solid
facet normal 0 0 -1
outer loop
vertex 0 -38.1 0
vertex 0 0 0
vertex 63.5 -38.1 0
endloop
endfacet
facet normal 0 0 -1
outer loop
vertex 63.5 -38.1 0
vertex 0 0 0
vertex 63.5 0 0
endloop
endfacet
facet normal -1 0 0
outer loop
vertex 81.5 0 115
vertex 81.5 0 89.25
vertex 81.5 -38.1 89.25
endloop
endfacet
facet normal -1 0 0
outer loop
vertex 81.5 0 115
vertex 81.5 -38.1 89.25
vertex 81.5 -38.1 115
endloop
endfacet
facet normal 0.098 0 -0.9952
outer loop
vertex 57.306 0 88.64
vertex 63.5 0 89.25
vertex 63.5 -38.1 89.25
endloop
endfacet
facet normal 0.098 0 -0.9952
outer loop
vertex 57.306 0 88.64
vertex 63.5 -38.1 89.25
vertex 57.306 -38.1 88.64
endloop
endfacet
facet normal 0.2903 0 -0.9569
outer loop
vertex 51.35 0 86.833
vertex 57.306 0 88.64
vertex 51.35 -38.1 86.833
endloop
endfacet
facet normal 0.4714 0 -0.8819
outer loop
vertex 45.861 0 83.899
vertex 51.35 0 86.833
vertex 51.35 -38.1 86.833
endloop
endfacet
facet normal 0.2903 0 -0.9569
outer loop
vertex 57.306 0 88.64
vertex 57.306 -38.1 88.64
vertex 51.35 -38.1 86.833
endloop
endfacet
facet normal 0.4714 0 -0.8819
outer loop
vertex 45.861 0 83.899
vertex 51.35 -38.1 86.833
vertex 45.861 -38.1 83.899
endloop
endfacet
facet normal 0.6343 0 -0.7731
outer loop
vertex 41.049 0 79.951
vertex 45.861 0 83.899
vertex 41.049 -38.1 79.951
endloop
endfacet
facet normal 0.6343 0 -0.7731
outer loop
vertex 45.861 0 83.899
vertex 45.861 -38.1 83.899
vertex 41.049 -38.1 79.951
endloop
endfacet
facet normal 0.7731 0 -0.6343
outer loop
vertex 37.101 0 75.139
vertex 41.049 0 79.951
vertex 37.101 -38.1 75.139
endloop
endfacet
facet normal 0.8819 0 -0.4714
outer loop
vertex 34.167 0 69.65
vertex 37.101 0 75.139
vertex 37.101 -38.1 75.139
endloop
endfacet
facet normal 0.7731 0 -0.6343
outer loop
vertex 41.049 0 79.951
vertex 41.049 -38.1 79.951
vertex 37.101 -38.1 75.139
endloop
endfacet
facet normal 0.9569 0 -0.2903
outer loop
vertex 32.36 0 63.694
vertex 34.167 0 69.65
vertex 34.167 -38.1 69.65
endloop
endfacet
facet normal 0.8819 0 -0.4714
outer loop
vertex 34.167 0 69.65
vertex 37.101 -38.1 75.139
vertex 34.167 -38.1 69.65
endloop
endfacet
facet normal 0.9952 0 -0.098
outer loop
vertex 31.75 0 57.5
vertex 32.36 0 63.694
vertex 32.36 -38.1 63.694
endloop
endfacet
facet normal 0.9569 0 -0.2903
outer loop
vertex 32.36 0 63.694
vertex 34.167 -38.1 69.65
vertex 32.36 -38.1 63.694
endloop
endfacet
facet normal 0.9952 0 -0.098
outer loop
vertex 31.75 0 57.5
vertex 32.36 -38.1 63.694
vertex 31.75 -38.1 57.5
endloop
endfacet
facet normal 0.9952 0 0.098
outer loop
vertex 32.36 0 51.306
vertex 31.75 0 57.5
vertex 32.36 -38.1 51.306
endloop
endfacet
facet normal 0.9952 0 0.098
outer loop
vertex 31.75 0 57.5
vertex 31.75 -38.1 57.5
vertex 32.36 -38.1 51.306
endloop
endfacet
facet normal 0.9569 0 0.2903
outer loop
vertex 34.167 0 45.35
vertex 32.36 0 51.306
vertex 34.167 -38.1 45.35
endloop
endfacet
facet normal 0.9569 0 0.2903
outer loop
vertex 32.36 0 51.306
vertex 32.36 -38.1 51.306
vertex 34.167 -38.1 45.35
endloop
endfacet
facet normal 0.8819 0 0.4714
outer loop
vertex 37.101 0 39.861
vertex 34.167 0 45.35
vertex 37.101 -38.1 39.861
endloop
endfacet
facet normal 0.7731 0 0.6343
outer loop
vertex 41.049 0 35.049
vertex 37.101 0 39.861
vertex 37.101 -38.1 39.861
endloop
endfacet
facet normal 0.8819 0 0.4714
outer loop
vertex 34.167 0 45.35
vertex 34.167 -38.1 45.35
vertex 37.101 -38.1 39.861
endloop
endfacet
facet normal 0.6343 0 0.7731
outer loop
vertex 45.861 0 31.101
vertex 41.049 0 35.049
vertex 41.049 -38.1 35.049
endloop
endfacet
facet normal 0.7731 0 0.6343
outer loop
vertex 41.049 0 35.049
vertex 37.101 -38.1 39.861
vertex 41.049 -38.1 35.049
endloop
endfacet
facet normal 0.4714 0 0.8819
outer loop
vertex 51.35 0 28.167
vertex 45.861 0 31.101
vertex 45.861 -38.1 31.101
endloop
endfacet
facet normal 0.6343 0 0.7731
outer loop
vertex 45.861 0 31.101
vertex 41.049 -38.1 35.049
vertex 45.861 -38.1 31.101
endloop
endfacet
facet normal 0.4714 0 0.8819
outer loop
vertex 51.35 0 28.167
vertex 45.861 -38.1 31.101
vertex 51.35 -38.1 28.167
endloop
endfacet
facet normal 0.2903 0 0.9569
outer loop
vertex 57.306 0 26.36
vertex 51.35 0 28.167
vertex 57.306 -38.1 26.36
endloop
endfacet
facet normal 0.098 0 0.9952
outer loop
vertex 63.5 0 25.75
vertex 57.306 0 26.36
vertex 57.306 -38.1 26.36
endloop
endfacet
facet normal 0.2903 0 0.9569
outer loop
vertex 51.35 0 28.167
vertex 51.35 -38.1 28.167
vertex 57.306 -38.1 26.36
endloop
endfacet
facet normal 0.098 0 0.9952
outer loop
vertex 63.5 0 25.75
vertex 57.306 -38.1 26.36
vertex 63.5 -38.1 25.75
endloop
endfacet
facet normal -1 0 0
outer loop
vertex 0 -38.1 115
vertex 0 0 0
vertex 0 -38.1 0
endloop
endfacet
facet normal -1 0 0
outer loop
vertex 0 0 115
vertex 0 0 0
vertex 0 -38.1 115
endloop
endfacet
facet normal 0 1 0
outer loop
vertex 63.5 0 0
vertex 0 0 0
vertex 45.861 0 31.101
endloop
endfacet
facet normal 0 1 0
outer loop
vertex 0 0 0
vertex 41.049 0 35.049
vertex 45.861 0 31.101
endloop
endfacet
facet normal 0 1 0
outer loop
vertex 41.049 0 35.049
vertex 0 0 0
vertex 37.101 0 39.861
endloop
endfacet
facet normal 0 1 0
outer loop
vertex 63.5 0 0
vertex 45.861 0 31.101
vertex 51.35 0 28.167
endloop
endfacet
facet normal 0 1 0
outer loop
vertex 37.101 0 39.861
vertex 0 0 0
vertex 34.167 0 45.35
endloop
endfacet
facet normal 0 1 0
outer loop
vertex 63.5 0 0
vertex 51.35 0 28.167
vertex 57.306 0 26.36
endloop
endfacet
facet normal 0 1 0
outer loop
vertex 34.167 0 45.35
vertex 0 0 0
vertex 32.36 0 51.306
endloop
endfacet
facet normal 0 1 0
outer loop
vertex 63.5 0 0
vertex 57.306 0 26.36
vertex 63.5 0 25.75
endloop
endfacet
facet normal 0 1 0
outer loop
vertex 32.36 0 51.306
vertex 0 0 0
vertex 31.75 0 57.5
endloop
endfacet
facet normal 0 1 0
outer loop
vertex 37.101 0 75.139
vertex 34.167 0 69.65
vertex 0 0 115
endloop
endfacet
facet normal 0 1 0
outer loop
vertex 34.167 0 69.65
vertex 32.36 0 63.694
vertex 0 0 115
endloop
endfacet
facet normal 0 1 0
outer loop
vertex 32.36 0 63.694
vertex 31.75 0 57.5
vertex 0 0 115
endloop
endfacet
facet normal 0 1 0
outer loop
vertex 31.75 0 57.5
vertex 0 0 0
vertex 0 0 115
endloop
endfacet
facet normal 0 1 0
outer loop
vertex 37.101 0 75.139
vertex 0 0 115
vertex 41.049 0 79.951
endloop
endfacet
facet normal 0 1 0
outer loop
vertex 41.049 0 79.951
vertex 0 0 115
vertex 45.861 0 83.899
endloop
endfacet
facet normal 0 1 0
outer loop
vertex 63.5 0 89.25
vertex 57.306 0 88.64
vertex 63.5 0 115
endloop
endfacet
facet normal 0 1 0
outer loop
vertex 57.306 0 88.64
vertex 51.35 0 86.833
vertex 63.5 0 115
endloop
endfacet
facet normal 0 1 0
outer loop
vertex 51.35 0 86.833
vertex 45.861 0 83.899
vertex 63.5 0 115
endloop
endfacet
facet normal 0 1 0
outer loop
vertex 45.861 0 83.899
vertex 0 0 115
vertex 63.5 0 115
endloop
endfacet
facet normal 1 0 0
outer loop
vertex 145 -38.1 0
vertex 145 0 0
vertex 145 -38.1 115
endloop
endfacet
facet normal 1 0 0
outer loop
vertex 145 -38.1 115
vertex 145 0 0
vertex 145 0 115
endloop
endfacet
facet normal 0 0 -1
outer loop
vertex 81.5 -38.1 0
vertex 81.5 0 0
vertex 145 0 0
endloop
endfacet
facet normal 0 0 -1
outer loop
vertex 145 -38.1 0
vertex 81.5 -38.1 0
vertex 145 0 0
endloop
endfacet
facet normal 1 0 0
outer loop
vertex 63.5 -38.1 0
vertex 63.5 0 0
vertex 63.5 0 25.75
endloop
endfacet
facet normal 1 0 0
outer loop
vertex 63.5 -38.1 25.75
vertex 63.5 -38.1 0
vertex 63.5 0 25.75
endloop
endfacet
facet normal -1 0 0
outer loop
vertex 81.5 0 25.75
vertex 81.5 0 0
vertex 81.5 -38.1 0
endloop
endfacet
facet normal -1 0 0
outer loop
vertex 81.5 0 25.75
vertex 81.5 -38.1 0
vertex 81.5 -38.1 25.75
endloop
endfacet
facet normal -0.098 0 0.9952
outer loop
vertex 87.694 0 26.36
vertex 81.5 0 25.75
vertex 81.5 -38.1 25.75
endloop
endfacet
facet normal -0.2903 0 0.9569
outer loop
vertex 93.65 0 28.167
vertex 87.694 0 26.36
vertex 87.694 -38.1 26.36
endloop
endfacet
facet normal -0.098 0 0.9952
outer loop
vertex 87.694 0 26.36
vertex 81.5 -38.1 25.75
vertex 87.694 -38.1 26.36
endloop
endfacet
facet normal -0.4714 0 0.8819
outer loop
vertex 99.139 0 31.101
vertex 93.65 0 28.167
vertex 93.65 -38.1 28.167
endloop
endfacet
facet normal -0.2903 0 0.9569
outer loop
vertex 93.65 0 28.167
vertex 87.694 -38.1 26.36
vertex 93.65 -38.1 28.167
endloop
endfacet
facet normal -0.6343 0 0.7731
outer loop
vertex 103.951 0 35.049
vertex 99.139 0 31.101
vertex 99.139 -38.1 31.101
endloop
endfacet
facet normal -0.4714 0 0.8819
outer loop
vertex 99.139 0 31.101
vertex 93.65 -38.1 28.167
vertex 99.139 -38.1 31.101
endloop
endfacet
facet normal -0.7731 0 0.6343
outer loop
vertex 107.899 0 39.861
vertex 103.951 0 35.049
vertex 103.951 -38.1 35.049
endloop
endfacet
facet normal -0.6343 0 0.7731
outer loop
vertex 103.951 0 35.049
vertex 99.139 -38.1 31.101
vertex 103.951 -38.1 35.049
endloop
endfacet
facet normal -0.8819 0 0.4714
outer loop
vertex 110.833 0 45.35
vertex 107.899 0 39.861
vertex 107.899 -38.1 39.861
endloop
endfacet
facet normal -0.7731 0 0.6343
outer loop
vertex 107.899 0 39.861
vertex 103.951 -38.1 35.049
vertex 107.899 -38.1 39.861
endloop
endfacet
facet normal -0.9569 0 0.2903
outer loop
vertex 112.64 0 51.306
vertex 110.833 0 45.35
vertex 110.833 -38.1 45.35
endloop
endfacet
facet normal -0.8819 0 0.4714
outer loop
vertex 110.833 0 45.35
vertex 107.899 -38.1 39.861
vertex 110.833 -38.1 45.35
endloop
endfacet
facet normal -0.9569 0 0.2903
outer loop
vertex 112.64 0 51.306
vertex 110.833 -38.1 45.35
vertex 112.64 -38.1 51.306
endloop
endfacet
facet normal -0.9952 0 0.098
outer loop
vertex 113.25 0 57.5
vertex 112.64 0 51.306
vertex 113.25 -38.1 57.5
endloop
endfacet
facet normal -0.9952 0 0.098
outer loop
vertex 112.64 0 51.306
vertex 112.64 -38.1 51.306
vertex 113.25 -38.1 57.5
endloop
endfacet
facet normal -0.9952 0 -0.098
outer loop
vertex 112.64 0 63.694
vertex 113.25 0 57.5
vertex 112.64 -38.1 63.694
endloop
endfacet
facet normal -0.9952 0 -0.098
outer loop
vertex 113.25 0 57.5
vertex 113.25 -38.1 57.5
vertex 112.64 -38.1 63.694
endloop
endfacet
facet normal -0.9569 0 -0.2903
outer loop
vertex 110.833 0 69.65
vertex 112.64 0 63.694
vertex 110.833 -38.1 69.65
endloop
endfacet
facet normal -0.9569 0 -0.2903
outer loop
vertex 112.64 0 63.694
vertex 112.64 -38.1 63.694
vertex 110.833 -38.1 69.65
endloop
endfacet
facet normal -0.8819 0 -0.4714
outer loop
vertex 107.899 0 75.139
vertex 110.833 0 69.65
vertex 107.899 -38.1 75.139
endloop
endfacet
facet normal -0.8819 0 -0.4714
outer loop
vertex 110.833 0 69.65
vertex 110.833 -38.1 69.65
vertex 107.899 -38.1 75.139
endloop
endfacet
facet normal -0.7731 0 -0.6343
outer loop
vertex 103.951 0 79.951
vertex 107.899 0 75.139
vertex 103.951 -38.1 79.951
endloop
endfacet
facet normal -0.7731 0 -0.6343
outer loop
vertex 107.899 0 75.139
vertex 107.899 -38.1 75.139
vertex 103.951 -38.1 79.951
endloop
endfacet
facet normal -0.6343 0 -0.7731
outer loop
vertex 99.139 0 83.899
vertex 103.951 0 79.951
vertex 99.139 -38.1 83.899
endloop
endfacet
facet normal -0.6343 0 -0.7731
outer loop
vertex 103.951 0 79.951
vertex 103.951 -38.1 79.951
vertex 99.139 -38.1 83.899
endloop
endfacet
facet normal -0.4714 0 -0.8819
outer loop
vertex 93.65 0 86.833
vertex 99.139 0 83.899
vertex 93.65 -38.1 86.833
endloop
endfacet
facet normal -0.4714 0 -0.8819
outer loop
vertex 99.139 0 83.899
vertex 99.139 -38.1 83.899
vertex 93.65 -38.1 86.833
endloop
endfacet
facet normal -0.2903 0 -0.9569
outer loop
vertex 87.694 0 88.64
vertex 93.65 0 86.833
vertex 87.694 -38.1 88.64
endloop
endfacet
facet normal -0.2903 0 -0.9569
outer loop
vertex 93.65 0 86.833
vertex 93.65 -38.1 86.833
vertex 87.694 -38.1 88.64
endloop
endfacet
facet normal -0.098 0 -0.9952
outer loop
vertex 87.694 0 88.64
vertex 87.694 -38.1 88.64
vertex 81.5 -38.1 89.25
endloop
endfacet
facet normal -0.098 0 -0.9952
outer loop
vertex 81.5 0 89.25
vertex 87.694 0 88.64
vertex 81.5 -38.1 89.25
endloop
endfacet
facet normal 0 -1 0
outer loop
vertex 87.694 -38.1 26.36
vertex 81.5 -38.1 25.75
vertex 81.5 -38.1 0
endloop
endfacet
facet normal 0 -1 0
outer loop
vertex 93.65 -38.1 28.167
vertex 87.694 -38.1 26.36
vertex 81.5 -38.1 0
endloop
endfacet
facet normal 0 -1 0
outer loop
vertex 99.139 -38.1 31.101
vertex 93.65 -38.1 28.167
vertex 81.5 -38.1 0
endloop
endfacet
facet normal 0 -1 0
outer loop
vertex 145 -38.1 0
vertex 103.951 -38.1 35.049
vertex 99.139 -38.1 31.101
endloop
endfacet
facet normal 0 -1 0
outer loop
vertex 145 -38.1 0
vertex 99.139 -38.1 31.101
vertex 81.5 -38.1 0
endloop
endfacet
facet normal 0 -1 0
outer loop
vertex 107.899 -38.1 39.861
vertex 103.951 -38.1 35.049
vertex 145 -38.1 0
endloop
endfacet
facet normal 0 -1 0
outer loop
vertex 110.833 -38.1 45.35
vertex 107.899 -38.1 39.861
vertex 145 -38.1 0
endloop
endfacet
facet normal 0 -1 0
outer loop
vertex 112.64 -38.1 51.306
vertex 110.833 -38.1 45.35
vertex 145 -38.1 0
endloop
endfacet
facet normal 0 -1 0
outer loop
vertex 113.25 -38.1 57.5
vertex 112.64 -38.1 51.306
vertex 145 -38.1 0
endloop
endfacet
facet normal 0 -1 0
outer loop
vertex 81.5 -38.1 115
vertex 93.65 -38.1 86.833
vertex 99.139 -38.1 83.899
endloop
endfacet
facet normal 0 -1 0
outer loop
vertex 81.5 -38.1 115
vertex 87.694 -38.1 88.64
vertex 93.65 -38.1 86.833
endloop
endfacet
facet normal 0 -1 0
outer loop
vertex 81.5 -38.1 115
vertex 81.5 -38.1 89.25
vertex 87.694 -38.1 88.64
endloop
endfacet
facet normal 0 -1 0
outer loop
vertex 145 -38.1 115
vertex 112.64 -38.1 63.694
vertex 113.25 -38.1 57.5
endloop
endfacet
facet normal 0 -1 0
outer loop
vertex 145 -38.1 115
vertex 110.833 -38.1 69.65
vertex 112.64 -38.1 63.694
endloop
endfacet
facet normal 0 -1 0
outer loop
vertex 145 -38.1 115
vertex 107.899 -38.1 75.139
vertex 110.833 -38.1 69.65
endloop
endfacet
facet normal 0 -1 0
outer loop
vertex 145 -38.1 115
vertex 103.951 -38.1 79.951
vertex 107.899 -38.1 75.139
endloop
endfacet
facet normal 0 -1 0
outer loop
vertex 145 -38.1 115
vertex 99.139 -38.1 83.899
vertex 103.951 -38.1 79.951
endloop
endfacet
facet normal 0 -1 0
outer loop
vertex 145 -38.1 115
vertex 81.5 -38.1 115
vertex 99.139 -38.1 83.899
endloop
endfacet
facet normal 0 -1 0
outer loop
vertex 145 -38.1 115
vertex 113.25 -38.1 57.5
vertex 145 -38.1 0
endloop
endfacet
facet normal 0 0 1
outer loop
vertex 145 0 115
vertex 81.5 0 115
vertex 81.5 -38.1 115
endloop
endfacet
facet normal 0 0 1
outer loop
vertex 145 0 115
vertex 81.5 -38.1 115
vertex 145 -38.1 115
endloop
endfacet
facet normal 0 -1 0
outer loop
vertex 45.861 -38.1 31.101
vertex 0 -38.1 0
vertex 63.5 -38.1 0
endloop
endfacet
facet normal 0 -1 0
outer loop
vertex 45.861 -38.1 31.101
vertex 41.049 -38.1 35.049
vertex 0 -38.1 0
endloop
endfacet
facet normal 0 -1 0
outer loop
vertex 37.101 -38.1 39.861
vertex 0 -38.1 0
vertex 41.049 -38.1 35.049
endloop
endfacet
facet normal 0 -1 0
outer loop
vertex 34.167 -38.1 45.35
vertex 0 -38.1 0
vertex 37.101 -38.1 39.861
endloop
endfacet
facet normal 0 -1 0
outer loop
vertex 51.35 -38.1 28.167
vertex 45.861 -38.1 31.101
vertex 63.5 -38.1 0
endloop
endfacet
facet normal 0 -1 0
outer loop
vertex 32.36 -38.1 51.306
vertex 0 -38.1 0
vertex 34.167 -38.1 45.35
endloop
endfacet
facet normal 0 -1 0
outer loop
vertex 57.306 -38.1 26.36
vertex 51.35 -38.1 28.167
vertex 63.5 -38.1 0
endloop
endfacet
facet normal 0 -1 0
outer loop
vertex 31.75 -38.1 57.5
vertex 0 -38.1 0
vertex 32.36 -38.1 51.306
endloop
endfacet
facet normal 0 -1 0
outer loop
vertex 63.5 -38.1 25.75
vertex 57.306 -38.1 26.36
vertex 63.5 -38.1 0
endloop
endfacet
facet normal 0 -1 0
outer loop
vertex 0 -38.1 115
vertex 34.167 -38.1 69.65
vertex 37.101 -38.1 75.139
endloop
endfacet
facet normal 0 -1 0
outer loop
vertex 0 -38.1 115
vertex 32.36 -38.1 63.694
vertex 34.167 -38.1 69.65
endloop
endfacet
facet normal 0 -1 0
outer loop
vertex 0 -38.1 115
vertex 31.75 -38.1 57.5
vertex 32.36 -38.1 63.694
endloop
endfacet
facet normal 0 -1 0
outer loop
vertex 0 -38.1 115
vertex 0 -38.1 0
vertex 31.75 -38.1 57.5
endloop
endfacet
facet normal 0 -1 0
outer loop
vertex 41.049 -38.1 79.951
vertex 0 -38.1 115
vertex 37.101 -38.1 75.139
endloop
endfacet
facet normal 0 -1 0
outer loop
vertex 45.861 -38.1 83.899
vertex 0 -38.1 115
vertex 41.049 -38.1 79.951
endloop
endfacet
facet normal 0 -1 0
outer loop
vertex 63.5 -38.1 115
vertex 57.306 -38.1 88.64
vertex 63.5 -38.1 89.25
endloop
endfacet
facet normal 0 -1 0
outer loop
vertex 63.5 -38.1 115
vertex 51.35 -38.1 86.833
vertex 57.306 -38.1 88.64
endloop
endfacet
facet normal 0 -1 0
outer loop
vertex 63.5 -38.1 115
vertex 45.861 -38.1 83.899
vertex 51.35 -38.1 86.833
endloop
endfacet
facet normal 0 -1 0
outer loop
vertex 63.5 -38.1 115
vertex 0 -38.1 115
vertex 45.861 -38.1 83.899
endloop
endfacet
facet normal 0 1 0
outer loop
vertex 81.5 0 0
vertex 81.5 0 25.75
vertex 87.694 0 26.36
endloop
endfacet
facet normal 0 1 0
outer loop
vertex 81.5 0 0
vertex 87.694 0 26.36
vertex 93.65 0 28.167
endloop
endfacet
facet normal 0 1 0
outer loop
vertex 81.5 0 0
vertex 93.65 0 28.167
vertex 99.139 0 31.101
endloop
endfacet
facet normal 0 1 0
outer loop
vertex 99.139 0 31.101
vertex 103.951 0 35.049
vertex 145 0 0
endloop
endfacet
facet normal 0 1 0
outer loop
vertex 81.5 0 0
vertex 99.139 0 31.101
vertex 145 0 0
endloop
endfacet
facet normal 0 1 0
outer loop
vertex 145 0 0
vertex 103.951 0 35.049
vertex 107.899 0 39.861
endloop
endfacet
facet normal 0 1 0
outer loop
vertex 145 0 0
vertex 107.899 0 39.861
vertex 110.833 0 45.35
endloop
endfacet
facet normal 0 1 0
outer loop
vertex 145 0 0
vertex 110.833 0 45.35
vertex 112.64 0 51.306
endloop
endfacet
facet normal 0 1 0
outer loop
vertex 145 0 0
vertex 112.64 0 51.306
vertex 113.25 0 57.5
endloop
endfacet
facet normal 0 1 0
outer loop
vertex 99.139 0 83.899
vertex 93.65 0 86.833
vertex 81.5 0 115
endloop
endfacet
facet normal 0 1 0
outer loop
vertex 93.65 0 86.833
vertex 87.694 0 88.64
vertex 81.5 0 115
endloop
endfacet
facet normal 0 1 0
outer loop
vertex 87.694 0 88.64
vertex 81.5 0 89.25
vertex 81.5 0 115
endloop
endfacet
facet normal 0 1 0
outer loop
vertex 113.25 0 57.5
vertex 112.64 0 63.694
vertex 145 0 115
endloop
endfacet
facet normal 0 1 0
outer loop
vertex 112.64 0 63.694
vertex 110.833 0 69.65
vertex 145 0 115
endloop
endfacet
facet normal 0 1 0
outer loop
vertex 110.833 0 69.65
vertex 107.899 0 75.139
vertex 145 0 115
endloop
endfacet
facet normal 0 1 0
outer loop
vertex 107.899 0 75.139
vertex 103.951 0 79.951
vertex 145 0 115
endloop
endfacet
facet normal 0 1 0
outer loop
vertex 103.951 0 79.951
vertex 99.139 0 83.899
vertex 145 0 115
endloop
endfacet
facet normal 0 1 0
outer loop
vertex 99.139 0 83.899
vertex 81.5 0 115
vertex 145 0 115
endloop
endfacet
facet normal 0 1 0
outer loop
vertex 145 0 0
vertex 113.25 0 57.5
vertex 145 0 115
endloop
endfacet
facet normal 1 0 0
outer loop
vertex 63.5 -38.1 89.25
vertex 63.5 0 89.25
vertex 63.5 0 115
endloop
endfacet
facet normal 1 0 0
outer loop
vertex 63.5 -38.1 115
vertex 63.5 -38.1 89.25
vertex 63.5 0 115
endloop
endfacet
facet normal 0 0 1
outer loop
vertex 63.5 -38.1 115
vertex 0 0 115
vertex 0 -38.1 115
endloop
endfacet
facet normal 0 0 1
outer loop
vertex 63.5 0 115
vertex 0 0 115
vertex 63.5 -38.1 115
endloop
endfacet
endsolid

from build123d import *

# Parameters (mm, degrees)
F0_W     = 63.5
F0_H     = 115
F1_DEPTH = 38.1
F3_DEPTH = 76.2
F4_R     = 31.75
F5_DEPTH = 76.2


with BuildPart() as f1:
    # F0 (on Front) → F1 (new body)
    with BuildSketch(Plane.XZ):
        with Locations((31.75, 57.5)):
            Rectangle(F0_W, F0_H)
    extrude(amount=F1_DEPTH)

    # F2 (on face) → F3 (cut)
    with BuildSketch(Plane.XZ.offset(38.1)):
        with BuildLine():
            Line((63.5, 25.75), (63.5, 89.25))
            ThreePointArc((63.5, 89.25), (31.75, 57.5), (63.5, 25.75))
        make_face()
    extrude(amount=-F3_DEPTH, mode=Mode.SUBTRACT)


with BuildPart() as f1b:
    # F0 (on Front) → F1, piece 2 (new body)
    with BuildSketch(Plane.XZ):
        with Locations((113.25, 57.5)):
            Rectangle(F0_W, F0_H)
    extrude(amount=F1_DEPTH)

    # F4 (on face) → F5 (cut)
    with BuildSketch(Plane.XZ.offset(38.1)):
        with Locations((81.5, 57.5)):
            Circle(F4_R)
    extrude(amount=-F5_DEPTH, mode=Mode.SUBTRACT)


solid = Compound([f1.part, f1b.part])
